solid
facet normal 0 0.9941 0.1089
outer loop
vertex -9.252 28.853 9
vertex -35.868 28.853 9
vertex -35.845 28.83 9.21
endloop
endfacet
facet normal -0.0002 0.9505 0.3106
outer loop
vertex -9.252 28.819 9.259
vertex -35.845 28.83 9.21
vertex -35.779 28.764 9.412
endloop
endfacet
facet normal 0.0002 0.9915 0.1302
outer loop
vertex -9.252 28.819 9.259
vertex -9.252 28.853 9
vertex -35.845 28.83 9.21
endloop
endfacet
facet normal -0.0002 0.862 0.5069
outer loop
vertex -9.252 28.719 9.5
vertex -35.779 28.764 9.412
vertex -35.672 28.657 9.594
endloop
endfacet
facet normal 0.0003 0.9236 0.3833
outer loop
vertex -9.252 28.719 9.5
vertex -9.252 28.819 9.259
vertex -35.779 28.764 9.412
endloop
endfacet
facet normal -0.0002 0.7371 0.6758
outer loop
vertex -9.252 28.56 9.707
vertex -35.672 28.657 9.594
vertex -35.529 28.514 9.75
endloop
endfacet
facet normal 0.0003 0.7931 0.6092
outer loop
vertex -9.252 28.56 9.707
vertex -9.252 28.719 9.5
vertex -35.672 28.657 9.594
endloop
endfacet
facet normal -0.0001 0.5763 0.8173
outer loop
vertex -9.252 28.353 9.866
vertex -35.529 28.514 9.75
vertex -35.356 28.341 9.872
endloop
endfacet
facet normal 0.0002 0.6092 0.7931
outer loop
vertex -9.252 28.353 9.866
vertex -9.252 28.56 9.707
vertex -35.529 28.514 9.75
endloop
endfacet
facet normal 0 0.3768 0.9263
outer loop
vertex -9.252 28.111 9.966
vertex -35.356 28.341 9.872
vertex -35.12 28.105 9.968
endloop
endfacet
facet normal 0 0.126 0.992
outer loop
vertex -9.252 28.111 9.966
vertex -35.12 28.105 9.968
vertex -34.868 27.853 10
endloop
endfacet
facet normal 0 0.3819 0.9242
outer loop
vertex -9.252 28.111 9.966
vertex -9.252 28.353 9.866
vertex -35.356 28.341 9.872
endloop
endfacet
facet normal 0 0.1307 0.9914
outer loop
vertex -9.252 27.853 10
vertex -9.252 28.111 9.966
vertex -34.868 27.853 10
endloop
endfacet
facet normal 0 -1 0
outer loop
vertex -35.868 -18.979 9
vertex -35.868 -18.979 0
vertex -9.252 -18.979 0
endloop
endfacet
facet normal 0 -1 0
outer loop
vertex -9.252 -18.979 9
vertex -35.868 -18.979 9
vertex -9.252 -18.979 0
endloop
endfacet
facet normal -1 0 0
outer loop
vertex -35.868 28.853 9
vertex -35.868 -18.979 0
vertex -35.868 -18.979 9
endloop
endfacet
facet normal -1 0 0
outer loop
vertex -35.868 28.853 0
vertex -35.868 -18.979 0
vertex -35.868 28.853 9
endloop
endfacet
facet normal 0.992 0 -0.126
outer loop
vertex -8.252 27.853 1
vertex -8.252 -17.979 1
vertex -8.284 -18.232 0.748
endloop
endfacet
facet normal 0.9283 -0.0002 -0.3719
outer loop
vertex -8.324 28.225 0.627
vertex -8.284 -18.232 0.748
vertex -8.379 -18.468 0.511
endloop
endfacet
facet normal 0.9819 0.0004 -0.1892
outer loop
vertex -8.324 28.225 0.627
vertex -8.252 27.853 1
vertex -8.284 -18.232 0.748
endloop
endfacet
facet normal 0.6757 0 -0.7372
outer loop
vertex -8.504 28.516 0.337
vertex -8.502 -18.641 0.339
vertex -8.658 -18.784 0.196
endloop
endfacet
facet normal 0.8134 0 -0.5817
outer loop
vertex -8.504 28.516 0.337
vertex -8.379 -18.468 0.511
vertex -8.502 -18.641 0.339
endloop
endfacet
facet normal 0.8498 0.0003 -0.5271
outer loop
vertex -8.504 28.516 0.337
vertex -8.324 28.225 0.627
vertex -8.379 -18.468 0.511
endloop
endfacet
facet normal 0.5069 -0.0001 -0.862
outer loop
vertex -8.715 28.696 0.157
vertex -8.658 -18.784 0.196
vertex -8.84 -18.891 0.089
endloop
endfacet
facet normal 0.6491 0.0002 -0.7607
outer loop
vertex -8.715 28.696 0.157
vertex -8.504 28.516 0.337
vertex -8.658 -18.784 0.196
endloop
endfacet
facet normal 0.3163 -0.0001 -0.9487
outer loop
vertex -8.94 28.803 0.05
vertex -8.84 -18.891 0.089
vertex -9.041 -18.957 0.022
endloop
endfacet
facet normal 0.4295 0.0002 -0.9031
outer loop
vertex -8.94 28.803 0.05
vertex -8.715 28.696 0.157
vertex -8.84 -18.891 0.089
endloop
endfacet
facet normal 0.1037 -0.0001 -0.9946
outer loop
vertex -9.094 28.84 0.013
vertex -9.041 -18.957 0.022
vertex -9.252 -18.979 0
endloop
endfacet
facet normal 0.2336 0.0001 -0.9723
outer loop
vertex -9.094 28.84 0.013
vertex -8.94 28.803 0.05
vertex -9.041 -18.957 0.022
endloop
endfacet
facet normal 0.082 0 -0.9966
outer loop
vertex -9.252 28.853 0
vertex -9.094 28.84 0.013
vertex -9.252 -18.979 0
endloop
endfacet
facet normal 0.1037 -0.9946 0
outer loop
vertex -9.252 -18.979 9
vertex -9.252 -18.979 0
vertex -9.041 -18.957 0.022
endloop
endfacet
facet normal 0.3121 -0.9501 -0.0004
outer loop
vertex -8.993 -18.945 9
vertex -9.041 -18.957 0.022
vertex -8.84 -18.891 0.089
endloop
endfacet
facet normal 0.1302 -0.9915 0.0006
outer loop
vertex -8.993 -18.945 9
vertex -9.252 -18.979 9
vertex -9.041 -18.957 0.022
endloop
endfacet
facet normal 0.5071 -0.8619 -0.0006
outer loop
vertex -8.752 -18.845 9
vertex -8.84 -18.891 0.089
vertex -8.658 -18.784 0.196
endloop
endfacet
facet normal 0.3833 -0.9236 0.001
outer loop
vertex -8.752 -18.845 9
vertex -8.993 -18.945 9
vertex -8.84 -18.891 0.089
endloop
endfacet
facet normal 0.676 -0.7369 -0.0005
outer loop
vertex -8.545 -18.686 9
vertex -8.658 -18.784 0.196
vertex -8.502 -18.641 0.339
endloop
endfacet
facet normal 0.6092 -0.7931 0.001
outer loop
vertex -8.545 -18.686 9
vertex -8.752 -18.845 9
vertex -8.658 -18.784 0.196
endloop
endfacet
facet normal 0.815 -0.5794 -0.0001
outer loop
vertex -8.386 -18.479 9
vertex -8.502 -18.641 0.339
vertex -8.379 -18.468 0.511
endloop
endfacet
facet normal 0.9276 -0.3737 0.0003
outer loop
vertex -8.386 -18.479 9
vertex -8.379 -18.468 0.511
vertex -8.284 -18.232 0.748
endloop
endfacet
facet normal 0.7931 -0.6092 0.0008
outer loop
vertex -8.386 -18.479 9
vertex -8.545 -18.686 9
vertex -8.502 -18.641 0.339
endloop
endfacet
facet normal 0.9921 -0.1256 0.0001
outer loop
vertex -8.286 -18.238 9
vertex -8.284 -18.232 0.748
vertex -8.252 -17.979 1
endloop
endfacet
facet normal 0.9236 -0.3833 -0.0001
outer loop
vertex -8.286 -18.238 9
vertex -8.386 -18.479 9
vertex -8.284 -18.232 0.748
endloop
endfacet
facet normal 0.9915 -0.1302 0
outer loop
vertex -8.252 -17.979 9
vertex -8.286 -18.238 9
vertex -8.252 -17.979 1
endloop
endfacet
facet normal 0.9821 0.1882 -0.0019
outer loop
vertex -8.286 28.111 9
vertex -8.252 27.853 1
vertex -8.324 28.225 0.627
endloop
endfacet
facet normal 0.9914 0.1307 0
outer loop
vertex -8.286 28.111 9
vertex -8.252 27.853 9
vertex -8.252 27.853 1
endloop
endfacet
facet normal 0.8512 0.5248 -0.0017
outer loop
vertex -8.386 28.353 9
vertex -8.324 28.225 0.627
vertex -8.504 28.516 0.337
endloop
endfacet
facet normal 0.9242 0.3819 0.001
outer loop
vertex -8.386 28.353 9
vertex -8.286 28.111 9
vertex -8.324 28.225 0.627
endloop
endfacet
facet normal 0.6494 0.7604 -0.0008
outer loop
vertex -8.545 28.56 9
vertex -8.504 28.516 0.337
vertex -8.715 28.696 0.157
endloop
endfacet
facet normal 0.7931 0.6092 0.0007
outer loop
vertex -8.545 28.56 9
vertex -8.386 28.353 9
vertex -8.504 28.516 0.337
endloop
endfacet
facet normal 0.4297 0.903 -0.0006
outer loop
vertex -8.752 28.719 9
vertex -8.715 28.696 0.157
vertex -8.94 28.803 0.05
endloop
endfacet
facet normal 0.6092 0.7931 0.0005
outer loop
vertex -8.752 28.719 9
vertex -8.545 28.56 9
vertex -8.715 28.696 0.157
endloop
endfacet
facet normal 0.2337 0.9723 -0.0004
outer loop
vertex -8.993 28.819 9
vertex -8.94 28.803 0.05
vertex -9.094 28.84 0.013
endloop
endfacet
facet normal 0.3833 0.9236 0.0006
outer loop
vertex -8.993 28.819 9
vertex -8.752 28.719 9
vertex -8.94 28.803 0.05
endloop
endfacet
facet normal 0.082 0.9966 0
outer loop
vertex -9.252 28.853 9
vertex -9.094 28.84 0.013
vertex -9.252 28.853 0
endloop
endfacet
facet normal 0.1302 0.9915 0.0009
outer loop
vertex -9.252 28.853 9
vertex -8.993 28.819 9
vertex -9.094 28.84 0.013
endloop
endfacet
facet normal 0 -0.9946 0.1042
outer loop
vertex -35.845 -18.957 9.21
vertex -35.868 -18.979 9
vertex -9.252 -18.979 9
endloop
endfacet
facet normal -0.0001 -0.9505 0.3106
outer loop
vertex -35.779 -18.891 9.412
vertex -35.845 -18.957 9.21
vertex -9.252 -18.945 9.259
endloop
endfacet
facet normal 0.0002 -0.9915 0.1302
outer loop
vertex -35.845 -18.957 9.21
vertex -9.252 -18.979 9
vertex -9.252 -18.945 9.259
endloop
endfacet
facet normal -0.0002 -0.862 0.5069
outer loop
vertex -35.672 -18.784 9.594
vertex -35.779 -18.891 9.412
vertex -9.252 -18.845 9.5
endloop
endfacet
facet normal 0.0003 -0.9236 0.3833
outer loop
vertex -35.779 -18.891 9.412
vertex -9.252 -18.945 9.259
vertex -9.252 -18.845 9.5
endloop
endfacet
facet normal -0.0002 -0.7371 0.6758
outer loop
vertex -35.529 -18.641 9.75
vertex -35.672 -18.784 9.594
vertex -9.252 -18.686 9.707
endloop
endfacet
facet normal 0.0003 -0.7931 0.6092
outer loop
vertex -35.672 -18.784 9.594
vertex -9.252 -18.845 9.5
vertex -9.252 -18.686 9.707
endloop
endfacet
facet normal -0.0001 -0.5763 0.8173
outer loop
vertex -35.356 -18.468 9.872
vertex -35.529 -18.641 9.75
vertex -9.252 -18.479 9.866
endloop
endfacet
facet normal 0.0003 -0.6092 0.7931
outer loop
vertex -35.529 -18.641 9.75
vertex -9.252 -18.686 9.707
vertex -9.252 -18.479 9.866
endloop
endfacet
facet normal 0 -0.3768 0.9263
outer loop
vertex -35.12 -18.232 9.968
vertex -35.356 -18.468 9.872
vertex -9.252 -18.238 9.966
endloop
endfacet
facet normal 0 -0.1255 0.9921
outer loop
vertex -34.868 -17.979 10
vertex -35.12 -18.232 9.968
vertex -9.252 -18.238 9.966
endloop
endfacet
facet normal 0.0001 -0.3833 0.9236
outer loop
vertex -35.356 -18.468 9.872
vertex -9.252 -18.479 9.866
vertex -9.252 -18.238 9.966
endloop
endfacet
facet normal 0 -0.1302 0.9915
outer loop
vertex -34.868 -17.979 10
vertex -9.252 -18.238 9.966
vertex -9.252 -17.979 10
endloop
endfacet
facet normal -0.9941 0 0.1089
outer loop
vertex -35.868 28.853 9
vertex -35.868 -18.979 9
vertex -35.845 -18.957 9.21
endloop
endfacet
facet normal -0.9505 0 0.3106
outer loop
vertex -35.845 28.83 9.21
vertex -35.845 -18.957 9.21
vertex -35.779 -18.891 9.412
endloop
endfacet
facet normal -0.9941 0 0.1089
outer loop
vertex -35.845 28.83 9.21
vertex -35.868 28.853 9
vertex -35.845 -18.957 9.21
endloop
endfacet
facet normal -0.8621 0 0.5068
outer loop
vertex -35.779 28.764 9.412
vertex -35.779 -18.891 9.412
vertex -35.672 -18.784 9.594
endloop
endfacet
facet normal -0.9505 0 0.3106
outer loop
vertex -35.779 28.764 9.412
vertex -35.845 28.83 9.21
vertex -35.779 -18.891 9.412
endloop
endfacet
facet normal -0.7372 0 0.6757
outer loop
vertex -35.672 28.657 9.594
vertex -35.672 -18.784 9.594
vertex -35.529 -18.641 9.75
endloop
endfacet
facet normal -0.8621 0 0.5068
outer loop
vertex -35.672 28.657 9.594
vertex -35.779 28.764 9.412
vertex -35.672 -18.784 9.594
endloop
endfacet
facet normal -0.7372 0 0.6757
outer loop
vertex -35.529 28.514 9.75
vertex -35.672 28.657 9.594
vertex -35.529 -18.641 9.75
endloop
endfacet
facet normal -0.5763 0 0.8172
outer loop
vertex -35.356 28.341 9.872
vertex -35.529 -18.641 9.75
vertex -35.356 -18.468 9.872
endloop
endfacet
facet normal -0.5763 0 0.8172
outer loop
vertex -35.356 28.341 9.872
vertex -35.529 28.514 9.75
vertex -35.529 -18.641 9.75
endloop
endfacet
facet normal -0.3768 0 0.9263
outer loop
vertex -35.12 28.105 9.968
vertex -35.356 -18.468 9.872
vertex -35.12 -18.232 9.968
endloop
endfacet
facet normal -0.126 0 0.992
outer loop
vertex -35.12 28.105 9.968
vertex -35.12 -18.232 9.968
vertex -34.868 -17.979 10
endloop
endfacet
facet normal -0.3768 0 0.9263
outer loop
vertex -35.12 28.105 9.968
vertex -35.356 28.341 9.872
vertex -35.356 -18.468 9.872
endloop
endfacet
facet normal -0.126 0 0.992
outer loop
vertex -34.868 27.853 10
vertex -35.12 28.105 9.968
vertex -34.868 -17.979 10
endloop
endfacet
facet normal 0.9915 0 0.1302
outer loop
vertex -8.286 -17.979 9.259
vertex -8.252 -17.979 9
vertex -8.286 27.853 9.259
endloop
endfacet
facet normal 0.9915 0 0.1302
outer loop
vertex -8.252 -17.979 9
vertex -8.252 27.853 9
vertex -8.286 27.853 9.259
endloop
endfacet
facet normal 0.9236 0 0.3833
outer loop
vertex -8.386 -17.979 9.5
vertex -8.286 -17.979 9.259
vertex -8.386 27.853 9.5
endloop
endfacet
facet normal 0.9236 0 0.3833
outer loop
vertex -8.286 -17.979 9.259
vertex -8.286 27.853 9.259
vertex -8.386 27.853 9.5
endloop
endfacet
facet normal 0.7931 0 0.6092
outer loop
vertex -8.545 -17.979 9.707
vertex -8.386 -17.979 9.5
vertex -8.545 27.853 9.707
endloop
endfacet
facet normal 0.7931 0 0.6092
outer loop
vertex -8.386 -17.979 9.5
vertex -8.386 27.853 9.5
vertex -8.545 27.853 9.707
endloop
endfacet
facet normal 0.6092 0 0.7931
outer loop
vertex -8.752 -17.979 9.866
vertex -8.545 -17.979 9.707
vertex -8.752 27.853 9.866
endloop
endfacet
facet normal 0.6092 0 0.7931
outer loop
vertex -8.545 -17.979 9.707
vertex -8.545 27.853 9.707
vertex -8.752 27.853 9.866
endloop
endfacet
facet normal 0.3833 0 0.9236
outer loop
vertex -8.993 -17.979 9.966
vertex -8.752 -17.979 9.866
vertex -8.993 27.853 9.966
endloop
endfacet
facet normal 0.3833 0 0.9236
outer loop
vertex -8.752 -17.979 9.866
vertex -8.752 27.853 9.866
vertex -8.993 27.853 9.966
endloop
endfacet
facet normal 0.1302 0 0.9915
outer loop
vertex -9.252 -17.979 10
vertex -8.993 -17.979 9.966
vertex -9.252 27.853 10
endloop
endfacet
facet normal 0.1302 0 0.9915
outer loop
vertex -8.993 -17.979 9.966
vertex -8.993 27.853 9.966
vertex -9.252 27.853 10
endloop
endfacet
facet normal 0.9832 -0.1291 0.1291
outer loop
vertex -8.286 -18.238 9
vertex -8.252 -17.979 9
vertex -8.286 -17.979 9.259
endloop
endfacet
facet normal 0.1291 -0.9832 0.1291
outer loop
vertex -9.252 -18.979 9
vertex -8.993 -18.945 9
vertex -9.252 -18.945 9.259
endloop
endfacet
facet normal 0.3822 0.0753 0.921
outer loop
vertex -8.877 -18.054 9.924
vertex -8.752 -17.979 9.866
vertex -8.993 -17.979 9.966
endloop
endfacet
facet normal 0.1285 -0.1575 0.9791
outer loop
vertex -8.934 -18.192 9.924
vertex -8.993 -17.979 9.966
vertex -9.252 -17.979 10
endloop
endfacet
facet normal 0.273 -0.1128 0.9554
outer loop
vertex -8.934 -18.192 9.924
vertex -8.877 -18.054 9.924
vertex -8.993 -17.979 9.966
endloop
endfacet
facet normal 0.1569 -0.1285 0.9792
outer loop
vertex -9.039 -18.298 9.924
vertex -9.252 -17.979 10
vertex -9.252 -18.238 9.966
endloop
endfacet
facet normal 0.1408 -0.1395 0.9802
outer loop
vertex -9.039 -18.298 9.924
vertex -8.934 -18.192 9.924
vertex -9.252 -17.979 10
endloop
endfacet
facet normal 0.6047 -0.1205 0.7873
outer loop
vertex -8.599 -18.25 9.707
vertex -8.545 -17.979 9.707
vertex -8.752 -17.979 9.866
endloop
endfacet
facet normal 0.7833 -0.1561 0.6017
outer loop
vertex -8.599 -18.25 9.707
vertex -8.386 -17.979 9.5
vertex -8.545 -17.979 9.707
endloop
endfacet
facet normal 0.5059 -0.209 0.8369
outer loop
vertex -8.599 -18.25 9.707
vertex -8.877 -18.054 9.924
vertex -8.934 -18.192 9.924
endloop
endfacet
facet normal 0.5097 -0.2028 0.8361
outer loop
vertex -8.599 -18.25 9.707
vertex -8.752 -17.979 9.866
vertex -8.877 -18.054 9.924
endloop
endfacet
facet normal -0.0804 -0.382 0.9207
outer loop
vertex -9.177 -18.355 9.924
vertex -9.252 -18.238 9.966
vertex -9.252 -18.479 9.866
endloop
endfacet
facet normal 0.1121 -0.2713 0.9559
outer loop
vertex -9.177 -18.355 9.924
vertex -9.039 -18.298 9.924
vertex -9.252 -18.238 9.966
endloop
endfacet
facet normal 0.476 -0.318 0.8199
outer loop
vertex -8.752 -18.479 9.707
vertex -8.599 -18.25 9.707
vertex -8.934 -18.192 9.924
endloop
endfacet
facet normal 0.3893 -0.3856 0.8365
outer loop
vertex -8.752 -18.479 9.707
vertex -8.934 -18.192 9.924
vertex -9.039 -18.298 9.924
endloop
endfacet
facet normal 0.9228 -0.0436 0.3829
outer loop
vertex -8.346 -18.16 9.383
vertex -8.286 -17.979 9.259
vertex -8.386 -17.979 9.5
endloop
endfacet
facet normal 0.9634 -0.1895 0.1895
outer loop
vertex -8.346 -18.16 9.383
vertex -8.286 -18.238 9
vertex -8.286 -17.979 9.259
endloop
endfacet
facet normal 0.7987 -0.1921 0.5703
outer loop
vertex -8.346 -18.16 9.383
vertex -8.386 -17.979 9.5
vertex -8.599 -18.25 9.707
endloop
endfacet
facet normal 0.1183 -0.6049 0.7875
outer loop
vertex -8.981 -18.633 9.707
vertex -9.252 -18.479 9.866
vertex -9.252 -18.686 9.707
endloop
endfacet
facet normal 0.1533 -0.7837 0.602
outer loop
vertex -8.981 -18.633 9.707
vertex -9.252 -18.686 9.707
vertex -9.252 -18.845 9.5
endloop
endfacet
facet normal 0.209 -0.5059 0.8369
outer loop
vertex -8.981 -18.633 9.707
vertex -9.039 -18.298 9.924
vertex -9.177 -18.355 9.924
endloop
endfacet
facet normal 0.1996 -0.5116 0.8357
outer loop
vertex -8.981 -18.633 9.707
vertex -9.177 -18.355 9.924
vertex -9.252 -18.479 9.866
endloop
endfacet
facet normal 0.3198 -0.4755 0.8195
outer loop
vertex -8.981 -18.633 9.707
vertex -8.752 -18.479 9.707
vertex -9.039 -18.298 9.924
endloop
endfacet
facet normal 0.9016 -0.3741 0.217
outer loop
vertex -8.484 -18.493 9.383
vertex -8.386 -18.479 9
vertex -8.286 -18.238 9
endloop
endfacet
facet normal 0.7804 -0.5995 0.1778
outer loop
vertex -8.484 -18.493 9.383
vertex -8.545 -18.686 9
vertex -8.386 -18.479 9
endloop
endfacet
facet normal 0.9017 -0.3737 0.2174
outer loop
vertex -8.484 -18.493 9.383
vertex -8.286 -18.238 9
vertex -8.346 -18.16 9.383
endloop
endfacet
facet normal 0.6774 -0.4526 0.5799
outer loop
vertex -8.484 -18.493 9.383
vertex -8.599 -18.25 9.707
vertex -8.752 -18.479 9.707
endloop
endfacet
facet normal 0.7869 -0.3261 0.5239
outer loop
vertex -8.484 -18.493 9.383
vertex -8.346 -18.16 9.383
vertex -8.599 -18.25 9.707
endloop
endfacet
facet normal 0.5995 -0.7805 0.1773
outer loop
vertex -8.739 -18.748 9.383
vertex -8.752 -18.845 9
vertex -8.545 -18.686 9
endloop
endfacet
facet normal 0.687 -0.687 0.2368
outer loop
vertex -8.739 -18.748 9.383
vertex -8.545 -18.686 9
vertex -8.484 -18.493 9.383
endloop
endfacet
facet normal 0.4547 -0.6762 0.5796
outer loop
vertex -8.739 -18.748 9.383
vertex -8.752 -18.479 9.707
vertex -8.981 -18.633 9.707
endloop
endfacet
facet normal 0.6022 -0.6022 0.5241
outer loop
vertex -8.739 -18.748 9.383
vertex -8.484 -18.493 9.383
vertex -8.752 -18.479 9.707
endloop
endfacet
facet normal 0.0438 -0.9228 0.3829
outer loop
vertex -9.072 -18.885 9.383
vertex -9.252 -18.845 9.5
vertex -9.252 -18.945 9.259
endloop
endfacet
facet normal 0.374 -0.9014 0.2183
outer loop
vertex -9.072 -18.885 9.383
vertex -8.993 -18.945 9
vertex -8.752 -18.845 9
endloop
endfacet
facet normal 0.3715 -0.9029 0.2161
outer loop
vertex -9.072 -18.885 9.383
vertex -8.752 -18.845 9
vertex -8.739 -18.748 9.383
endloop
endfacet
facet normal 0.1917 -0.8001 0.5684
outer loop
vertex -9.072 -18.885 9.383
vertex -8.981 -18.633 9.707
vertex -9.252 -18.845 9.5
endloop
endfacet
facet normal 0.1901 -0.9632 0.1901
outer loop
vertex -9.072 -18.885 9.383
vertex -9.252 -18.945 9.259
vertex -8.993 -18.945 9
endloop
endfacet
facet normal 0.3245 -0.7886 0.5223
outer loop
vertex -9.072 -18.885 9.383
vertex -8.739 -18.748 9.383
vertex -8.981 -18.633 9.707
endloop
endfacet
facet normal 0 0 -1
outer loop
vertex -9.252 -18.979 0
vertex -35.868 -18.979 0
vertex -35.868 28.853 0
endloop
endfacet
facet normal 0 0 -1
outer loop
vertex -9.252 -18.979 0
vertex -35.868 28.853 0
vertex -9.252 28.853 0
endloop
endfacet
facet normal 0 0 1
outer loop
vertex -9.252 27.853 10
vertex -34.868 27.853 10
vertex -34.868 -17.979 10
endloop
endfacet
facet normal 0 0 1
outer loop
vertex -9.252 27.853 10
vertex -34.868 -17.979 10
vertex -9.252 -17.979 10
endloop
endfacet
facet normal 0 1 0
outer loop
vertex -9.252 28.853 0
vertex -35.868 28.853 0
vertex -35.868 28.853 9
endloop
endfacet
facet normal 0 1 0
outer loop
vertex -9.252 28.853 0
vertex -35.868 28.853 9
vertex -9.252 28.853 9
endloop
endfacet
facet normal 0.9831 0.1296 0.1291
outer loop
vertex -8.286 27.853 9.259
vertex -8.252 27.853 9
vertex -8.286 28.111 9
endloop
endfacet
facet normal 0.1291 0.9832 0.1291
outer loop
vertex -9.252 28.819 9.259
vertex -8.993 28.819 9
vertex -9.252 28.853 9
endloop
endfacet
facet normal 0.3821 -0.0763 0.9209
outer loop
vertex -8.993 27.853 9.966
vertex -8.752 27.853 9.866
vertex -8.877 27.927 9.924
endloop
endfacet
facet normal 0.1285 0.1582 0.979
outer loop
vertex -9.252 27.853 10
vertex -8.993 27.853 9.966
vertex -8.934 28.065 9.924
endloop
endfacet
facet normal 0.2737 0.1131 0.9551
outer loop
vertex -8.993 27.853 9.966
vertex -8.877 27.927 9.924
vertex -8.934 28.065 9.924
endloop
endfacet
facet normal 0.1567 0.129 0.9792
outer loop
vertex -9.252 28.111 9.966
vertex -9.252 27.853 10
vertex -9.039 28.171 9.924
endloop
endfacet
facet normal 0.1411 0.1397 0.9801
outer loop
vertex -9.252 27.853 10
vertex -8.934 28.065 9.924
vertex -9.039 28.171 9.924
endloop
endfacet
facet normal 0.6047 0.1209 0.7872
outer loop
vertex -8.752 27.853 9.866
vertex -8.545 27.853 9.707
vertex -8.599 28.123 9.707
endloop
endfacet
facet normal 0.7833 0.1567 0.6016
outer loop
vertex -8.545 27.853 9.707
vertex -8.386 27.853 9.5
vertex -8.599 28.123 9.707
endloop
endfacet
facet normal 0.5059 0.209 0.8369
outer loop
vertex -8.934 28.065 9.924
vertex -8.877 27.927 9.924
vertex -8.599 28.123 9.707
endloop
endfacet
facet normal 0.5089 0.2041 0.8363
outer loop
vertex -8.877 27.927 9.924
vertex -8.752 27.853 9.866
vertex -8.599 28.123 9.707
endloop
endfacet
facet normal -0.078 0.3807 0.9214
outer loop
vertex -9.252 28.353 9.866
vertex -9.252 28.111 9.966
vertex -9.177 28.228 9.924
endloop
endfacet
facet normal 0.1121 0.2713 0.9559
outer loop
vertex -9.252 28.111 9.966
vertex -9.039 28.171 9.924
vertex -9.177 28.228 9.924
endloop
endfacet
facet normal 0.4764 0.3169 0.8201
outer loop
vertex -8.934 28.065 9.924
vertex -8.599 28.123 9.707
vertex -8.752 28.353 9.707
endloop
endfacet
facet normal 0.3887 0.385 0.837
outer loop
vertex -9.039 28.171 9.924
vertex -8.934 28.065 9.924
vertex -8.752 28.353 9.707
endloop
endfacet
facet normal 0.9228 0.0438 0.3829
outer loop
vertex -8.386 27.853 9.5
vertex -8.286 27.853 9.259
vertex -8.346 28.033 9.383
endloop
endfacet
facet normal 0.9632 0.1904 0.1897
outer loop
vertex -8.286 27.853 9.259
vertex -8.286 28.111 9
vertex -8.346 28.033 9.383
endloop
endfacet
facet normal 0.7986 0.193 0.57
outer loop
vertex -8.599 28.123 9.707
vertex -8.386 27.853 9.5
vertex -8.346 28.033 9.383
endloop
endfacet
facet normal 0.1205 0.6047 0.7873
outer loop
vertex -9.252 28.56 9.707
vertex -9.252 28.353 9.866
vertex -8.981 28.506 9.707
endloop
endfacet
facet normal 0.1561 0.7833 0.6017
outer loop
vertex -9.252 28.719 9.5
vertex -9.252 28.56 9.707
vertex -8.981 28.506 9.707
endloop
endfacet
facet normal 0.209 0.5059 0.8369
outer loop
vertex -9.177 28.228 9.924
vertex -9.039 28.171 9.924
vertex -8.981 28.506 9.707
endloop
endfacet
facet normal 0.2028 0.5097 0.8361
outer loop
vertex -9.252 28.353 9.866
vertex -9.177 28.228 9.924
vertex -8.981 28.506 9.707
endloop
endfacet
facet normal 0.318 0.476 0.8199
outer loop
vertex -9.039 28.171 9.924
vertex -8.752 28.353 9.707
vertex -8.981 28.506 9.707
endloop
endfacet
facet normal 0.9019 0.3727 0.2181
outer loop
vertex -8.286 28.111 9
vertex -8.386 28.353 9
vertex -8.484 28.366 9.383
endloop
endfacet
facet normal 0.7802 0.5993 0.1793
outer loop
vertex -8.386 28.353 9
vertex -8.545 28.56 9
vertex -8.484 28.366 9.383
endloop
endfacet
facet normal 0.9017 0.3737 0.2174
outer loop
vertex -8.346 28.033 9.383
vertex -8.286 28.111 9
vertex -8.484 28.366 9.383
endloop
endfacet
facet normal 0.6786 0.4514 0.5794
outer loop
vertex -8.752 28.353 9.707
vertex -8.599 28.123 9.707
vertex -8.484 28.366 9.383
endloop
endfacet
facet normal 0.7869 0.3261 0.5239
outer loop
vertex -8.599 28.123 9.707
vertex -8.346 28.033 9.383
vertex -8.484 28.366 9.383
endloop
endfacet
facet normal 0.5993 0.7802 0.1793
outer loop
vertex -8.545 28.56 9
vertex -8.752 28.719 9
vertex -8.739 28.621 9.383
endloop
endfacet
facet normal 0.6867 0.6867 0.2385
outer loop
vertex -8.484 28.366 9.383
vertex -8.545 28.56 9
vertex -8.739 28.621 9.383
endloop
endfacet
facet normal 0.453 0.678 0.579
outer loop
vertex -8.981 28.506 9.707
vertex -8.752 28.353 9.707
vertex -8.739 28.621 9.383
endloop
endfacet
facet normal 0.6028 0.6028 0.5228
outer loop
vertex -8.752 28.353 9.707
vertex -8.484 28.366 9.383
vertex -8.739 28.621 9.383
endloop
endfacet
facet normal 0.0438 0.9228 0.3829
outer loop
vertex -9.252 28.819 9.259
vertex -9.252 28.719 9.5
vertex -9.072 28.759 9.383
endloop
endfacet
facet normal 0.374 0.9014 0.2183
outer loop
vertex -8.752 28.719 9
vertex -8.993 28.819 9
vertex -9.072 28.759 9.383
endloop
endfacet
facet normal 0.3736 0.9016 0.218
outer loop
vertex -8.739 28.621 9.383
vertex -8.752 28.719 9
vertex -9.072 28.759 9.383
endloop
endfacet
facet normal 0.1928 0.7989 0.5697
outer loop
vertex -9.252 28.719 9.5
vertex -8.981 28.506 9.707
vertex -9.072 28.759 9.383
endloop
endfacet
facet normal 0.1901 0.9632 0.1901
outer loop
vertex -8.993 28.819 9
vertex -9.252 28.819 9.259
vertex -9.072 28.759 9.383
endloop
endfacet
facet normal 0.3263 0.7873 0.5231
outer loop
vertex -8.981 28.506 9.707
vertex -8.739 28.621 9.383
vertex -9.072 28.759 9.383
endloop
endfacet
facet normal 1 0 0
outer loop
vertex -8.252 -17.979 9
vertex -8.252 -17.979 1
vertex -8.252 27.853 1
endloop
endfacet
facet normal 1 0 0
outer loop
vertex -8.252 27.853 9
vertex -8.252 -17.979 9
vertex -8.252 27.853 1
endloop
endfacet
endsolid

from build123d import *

# Parameters (mm, degrees)
F0_W     = 27.6158377528
F0_H     = 47.8320233524
F1_DEPTH = 10
F2_R     = 1


# Not quite as in the source:
# - the program builds the solid bodies; features that only make, move or delete a surface that nothing else refers to are left out


with BuildPart() as f1:
    # F0 (on Top) → F1 (new body)
    with BuildSketch(Plane.XY):
        with Locations((-22.0598205924, 4.9366392195)):
            Rectangle(F0_W, F0_H)
    extrude(amount=F1_DEPTH)

    # F2
    f2_edges = [f1.edges().sort_by_distance(p)[0] for p in [
        (-8.251902, -18.979372, 5),
        (-8.251902, 28.852651, 5),
        (-8.251902, 4.936639, 0),
        (-8.251902, 4.936639, 10),
        (-22.059821, 28.852651, 10),
        (-35.867739, 4.936639, 10),
        (-22.059821, -18.979372, 10),
    ]]
    fillet(f2_edges, radius=F2_R)


solid = f1.part
